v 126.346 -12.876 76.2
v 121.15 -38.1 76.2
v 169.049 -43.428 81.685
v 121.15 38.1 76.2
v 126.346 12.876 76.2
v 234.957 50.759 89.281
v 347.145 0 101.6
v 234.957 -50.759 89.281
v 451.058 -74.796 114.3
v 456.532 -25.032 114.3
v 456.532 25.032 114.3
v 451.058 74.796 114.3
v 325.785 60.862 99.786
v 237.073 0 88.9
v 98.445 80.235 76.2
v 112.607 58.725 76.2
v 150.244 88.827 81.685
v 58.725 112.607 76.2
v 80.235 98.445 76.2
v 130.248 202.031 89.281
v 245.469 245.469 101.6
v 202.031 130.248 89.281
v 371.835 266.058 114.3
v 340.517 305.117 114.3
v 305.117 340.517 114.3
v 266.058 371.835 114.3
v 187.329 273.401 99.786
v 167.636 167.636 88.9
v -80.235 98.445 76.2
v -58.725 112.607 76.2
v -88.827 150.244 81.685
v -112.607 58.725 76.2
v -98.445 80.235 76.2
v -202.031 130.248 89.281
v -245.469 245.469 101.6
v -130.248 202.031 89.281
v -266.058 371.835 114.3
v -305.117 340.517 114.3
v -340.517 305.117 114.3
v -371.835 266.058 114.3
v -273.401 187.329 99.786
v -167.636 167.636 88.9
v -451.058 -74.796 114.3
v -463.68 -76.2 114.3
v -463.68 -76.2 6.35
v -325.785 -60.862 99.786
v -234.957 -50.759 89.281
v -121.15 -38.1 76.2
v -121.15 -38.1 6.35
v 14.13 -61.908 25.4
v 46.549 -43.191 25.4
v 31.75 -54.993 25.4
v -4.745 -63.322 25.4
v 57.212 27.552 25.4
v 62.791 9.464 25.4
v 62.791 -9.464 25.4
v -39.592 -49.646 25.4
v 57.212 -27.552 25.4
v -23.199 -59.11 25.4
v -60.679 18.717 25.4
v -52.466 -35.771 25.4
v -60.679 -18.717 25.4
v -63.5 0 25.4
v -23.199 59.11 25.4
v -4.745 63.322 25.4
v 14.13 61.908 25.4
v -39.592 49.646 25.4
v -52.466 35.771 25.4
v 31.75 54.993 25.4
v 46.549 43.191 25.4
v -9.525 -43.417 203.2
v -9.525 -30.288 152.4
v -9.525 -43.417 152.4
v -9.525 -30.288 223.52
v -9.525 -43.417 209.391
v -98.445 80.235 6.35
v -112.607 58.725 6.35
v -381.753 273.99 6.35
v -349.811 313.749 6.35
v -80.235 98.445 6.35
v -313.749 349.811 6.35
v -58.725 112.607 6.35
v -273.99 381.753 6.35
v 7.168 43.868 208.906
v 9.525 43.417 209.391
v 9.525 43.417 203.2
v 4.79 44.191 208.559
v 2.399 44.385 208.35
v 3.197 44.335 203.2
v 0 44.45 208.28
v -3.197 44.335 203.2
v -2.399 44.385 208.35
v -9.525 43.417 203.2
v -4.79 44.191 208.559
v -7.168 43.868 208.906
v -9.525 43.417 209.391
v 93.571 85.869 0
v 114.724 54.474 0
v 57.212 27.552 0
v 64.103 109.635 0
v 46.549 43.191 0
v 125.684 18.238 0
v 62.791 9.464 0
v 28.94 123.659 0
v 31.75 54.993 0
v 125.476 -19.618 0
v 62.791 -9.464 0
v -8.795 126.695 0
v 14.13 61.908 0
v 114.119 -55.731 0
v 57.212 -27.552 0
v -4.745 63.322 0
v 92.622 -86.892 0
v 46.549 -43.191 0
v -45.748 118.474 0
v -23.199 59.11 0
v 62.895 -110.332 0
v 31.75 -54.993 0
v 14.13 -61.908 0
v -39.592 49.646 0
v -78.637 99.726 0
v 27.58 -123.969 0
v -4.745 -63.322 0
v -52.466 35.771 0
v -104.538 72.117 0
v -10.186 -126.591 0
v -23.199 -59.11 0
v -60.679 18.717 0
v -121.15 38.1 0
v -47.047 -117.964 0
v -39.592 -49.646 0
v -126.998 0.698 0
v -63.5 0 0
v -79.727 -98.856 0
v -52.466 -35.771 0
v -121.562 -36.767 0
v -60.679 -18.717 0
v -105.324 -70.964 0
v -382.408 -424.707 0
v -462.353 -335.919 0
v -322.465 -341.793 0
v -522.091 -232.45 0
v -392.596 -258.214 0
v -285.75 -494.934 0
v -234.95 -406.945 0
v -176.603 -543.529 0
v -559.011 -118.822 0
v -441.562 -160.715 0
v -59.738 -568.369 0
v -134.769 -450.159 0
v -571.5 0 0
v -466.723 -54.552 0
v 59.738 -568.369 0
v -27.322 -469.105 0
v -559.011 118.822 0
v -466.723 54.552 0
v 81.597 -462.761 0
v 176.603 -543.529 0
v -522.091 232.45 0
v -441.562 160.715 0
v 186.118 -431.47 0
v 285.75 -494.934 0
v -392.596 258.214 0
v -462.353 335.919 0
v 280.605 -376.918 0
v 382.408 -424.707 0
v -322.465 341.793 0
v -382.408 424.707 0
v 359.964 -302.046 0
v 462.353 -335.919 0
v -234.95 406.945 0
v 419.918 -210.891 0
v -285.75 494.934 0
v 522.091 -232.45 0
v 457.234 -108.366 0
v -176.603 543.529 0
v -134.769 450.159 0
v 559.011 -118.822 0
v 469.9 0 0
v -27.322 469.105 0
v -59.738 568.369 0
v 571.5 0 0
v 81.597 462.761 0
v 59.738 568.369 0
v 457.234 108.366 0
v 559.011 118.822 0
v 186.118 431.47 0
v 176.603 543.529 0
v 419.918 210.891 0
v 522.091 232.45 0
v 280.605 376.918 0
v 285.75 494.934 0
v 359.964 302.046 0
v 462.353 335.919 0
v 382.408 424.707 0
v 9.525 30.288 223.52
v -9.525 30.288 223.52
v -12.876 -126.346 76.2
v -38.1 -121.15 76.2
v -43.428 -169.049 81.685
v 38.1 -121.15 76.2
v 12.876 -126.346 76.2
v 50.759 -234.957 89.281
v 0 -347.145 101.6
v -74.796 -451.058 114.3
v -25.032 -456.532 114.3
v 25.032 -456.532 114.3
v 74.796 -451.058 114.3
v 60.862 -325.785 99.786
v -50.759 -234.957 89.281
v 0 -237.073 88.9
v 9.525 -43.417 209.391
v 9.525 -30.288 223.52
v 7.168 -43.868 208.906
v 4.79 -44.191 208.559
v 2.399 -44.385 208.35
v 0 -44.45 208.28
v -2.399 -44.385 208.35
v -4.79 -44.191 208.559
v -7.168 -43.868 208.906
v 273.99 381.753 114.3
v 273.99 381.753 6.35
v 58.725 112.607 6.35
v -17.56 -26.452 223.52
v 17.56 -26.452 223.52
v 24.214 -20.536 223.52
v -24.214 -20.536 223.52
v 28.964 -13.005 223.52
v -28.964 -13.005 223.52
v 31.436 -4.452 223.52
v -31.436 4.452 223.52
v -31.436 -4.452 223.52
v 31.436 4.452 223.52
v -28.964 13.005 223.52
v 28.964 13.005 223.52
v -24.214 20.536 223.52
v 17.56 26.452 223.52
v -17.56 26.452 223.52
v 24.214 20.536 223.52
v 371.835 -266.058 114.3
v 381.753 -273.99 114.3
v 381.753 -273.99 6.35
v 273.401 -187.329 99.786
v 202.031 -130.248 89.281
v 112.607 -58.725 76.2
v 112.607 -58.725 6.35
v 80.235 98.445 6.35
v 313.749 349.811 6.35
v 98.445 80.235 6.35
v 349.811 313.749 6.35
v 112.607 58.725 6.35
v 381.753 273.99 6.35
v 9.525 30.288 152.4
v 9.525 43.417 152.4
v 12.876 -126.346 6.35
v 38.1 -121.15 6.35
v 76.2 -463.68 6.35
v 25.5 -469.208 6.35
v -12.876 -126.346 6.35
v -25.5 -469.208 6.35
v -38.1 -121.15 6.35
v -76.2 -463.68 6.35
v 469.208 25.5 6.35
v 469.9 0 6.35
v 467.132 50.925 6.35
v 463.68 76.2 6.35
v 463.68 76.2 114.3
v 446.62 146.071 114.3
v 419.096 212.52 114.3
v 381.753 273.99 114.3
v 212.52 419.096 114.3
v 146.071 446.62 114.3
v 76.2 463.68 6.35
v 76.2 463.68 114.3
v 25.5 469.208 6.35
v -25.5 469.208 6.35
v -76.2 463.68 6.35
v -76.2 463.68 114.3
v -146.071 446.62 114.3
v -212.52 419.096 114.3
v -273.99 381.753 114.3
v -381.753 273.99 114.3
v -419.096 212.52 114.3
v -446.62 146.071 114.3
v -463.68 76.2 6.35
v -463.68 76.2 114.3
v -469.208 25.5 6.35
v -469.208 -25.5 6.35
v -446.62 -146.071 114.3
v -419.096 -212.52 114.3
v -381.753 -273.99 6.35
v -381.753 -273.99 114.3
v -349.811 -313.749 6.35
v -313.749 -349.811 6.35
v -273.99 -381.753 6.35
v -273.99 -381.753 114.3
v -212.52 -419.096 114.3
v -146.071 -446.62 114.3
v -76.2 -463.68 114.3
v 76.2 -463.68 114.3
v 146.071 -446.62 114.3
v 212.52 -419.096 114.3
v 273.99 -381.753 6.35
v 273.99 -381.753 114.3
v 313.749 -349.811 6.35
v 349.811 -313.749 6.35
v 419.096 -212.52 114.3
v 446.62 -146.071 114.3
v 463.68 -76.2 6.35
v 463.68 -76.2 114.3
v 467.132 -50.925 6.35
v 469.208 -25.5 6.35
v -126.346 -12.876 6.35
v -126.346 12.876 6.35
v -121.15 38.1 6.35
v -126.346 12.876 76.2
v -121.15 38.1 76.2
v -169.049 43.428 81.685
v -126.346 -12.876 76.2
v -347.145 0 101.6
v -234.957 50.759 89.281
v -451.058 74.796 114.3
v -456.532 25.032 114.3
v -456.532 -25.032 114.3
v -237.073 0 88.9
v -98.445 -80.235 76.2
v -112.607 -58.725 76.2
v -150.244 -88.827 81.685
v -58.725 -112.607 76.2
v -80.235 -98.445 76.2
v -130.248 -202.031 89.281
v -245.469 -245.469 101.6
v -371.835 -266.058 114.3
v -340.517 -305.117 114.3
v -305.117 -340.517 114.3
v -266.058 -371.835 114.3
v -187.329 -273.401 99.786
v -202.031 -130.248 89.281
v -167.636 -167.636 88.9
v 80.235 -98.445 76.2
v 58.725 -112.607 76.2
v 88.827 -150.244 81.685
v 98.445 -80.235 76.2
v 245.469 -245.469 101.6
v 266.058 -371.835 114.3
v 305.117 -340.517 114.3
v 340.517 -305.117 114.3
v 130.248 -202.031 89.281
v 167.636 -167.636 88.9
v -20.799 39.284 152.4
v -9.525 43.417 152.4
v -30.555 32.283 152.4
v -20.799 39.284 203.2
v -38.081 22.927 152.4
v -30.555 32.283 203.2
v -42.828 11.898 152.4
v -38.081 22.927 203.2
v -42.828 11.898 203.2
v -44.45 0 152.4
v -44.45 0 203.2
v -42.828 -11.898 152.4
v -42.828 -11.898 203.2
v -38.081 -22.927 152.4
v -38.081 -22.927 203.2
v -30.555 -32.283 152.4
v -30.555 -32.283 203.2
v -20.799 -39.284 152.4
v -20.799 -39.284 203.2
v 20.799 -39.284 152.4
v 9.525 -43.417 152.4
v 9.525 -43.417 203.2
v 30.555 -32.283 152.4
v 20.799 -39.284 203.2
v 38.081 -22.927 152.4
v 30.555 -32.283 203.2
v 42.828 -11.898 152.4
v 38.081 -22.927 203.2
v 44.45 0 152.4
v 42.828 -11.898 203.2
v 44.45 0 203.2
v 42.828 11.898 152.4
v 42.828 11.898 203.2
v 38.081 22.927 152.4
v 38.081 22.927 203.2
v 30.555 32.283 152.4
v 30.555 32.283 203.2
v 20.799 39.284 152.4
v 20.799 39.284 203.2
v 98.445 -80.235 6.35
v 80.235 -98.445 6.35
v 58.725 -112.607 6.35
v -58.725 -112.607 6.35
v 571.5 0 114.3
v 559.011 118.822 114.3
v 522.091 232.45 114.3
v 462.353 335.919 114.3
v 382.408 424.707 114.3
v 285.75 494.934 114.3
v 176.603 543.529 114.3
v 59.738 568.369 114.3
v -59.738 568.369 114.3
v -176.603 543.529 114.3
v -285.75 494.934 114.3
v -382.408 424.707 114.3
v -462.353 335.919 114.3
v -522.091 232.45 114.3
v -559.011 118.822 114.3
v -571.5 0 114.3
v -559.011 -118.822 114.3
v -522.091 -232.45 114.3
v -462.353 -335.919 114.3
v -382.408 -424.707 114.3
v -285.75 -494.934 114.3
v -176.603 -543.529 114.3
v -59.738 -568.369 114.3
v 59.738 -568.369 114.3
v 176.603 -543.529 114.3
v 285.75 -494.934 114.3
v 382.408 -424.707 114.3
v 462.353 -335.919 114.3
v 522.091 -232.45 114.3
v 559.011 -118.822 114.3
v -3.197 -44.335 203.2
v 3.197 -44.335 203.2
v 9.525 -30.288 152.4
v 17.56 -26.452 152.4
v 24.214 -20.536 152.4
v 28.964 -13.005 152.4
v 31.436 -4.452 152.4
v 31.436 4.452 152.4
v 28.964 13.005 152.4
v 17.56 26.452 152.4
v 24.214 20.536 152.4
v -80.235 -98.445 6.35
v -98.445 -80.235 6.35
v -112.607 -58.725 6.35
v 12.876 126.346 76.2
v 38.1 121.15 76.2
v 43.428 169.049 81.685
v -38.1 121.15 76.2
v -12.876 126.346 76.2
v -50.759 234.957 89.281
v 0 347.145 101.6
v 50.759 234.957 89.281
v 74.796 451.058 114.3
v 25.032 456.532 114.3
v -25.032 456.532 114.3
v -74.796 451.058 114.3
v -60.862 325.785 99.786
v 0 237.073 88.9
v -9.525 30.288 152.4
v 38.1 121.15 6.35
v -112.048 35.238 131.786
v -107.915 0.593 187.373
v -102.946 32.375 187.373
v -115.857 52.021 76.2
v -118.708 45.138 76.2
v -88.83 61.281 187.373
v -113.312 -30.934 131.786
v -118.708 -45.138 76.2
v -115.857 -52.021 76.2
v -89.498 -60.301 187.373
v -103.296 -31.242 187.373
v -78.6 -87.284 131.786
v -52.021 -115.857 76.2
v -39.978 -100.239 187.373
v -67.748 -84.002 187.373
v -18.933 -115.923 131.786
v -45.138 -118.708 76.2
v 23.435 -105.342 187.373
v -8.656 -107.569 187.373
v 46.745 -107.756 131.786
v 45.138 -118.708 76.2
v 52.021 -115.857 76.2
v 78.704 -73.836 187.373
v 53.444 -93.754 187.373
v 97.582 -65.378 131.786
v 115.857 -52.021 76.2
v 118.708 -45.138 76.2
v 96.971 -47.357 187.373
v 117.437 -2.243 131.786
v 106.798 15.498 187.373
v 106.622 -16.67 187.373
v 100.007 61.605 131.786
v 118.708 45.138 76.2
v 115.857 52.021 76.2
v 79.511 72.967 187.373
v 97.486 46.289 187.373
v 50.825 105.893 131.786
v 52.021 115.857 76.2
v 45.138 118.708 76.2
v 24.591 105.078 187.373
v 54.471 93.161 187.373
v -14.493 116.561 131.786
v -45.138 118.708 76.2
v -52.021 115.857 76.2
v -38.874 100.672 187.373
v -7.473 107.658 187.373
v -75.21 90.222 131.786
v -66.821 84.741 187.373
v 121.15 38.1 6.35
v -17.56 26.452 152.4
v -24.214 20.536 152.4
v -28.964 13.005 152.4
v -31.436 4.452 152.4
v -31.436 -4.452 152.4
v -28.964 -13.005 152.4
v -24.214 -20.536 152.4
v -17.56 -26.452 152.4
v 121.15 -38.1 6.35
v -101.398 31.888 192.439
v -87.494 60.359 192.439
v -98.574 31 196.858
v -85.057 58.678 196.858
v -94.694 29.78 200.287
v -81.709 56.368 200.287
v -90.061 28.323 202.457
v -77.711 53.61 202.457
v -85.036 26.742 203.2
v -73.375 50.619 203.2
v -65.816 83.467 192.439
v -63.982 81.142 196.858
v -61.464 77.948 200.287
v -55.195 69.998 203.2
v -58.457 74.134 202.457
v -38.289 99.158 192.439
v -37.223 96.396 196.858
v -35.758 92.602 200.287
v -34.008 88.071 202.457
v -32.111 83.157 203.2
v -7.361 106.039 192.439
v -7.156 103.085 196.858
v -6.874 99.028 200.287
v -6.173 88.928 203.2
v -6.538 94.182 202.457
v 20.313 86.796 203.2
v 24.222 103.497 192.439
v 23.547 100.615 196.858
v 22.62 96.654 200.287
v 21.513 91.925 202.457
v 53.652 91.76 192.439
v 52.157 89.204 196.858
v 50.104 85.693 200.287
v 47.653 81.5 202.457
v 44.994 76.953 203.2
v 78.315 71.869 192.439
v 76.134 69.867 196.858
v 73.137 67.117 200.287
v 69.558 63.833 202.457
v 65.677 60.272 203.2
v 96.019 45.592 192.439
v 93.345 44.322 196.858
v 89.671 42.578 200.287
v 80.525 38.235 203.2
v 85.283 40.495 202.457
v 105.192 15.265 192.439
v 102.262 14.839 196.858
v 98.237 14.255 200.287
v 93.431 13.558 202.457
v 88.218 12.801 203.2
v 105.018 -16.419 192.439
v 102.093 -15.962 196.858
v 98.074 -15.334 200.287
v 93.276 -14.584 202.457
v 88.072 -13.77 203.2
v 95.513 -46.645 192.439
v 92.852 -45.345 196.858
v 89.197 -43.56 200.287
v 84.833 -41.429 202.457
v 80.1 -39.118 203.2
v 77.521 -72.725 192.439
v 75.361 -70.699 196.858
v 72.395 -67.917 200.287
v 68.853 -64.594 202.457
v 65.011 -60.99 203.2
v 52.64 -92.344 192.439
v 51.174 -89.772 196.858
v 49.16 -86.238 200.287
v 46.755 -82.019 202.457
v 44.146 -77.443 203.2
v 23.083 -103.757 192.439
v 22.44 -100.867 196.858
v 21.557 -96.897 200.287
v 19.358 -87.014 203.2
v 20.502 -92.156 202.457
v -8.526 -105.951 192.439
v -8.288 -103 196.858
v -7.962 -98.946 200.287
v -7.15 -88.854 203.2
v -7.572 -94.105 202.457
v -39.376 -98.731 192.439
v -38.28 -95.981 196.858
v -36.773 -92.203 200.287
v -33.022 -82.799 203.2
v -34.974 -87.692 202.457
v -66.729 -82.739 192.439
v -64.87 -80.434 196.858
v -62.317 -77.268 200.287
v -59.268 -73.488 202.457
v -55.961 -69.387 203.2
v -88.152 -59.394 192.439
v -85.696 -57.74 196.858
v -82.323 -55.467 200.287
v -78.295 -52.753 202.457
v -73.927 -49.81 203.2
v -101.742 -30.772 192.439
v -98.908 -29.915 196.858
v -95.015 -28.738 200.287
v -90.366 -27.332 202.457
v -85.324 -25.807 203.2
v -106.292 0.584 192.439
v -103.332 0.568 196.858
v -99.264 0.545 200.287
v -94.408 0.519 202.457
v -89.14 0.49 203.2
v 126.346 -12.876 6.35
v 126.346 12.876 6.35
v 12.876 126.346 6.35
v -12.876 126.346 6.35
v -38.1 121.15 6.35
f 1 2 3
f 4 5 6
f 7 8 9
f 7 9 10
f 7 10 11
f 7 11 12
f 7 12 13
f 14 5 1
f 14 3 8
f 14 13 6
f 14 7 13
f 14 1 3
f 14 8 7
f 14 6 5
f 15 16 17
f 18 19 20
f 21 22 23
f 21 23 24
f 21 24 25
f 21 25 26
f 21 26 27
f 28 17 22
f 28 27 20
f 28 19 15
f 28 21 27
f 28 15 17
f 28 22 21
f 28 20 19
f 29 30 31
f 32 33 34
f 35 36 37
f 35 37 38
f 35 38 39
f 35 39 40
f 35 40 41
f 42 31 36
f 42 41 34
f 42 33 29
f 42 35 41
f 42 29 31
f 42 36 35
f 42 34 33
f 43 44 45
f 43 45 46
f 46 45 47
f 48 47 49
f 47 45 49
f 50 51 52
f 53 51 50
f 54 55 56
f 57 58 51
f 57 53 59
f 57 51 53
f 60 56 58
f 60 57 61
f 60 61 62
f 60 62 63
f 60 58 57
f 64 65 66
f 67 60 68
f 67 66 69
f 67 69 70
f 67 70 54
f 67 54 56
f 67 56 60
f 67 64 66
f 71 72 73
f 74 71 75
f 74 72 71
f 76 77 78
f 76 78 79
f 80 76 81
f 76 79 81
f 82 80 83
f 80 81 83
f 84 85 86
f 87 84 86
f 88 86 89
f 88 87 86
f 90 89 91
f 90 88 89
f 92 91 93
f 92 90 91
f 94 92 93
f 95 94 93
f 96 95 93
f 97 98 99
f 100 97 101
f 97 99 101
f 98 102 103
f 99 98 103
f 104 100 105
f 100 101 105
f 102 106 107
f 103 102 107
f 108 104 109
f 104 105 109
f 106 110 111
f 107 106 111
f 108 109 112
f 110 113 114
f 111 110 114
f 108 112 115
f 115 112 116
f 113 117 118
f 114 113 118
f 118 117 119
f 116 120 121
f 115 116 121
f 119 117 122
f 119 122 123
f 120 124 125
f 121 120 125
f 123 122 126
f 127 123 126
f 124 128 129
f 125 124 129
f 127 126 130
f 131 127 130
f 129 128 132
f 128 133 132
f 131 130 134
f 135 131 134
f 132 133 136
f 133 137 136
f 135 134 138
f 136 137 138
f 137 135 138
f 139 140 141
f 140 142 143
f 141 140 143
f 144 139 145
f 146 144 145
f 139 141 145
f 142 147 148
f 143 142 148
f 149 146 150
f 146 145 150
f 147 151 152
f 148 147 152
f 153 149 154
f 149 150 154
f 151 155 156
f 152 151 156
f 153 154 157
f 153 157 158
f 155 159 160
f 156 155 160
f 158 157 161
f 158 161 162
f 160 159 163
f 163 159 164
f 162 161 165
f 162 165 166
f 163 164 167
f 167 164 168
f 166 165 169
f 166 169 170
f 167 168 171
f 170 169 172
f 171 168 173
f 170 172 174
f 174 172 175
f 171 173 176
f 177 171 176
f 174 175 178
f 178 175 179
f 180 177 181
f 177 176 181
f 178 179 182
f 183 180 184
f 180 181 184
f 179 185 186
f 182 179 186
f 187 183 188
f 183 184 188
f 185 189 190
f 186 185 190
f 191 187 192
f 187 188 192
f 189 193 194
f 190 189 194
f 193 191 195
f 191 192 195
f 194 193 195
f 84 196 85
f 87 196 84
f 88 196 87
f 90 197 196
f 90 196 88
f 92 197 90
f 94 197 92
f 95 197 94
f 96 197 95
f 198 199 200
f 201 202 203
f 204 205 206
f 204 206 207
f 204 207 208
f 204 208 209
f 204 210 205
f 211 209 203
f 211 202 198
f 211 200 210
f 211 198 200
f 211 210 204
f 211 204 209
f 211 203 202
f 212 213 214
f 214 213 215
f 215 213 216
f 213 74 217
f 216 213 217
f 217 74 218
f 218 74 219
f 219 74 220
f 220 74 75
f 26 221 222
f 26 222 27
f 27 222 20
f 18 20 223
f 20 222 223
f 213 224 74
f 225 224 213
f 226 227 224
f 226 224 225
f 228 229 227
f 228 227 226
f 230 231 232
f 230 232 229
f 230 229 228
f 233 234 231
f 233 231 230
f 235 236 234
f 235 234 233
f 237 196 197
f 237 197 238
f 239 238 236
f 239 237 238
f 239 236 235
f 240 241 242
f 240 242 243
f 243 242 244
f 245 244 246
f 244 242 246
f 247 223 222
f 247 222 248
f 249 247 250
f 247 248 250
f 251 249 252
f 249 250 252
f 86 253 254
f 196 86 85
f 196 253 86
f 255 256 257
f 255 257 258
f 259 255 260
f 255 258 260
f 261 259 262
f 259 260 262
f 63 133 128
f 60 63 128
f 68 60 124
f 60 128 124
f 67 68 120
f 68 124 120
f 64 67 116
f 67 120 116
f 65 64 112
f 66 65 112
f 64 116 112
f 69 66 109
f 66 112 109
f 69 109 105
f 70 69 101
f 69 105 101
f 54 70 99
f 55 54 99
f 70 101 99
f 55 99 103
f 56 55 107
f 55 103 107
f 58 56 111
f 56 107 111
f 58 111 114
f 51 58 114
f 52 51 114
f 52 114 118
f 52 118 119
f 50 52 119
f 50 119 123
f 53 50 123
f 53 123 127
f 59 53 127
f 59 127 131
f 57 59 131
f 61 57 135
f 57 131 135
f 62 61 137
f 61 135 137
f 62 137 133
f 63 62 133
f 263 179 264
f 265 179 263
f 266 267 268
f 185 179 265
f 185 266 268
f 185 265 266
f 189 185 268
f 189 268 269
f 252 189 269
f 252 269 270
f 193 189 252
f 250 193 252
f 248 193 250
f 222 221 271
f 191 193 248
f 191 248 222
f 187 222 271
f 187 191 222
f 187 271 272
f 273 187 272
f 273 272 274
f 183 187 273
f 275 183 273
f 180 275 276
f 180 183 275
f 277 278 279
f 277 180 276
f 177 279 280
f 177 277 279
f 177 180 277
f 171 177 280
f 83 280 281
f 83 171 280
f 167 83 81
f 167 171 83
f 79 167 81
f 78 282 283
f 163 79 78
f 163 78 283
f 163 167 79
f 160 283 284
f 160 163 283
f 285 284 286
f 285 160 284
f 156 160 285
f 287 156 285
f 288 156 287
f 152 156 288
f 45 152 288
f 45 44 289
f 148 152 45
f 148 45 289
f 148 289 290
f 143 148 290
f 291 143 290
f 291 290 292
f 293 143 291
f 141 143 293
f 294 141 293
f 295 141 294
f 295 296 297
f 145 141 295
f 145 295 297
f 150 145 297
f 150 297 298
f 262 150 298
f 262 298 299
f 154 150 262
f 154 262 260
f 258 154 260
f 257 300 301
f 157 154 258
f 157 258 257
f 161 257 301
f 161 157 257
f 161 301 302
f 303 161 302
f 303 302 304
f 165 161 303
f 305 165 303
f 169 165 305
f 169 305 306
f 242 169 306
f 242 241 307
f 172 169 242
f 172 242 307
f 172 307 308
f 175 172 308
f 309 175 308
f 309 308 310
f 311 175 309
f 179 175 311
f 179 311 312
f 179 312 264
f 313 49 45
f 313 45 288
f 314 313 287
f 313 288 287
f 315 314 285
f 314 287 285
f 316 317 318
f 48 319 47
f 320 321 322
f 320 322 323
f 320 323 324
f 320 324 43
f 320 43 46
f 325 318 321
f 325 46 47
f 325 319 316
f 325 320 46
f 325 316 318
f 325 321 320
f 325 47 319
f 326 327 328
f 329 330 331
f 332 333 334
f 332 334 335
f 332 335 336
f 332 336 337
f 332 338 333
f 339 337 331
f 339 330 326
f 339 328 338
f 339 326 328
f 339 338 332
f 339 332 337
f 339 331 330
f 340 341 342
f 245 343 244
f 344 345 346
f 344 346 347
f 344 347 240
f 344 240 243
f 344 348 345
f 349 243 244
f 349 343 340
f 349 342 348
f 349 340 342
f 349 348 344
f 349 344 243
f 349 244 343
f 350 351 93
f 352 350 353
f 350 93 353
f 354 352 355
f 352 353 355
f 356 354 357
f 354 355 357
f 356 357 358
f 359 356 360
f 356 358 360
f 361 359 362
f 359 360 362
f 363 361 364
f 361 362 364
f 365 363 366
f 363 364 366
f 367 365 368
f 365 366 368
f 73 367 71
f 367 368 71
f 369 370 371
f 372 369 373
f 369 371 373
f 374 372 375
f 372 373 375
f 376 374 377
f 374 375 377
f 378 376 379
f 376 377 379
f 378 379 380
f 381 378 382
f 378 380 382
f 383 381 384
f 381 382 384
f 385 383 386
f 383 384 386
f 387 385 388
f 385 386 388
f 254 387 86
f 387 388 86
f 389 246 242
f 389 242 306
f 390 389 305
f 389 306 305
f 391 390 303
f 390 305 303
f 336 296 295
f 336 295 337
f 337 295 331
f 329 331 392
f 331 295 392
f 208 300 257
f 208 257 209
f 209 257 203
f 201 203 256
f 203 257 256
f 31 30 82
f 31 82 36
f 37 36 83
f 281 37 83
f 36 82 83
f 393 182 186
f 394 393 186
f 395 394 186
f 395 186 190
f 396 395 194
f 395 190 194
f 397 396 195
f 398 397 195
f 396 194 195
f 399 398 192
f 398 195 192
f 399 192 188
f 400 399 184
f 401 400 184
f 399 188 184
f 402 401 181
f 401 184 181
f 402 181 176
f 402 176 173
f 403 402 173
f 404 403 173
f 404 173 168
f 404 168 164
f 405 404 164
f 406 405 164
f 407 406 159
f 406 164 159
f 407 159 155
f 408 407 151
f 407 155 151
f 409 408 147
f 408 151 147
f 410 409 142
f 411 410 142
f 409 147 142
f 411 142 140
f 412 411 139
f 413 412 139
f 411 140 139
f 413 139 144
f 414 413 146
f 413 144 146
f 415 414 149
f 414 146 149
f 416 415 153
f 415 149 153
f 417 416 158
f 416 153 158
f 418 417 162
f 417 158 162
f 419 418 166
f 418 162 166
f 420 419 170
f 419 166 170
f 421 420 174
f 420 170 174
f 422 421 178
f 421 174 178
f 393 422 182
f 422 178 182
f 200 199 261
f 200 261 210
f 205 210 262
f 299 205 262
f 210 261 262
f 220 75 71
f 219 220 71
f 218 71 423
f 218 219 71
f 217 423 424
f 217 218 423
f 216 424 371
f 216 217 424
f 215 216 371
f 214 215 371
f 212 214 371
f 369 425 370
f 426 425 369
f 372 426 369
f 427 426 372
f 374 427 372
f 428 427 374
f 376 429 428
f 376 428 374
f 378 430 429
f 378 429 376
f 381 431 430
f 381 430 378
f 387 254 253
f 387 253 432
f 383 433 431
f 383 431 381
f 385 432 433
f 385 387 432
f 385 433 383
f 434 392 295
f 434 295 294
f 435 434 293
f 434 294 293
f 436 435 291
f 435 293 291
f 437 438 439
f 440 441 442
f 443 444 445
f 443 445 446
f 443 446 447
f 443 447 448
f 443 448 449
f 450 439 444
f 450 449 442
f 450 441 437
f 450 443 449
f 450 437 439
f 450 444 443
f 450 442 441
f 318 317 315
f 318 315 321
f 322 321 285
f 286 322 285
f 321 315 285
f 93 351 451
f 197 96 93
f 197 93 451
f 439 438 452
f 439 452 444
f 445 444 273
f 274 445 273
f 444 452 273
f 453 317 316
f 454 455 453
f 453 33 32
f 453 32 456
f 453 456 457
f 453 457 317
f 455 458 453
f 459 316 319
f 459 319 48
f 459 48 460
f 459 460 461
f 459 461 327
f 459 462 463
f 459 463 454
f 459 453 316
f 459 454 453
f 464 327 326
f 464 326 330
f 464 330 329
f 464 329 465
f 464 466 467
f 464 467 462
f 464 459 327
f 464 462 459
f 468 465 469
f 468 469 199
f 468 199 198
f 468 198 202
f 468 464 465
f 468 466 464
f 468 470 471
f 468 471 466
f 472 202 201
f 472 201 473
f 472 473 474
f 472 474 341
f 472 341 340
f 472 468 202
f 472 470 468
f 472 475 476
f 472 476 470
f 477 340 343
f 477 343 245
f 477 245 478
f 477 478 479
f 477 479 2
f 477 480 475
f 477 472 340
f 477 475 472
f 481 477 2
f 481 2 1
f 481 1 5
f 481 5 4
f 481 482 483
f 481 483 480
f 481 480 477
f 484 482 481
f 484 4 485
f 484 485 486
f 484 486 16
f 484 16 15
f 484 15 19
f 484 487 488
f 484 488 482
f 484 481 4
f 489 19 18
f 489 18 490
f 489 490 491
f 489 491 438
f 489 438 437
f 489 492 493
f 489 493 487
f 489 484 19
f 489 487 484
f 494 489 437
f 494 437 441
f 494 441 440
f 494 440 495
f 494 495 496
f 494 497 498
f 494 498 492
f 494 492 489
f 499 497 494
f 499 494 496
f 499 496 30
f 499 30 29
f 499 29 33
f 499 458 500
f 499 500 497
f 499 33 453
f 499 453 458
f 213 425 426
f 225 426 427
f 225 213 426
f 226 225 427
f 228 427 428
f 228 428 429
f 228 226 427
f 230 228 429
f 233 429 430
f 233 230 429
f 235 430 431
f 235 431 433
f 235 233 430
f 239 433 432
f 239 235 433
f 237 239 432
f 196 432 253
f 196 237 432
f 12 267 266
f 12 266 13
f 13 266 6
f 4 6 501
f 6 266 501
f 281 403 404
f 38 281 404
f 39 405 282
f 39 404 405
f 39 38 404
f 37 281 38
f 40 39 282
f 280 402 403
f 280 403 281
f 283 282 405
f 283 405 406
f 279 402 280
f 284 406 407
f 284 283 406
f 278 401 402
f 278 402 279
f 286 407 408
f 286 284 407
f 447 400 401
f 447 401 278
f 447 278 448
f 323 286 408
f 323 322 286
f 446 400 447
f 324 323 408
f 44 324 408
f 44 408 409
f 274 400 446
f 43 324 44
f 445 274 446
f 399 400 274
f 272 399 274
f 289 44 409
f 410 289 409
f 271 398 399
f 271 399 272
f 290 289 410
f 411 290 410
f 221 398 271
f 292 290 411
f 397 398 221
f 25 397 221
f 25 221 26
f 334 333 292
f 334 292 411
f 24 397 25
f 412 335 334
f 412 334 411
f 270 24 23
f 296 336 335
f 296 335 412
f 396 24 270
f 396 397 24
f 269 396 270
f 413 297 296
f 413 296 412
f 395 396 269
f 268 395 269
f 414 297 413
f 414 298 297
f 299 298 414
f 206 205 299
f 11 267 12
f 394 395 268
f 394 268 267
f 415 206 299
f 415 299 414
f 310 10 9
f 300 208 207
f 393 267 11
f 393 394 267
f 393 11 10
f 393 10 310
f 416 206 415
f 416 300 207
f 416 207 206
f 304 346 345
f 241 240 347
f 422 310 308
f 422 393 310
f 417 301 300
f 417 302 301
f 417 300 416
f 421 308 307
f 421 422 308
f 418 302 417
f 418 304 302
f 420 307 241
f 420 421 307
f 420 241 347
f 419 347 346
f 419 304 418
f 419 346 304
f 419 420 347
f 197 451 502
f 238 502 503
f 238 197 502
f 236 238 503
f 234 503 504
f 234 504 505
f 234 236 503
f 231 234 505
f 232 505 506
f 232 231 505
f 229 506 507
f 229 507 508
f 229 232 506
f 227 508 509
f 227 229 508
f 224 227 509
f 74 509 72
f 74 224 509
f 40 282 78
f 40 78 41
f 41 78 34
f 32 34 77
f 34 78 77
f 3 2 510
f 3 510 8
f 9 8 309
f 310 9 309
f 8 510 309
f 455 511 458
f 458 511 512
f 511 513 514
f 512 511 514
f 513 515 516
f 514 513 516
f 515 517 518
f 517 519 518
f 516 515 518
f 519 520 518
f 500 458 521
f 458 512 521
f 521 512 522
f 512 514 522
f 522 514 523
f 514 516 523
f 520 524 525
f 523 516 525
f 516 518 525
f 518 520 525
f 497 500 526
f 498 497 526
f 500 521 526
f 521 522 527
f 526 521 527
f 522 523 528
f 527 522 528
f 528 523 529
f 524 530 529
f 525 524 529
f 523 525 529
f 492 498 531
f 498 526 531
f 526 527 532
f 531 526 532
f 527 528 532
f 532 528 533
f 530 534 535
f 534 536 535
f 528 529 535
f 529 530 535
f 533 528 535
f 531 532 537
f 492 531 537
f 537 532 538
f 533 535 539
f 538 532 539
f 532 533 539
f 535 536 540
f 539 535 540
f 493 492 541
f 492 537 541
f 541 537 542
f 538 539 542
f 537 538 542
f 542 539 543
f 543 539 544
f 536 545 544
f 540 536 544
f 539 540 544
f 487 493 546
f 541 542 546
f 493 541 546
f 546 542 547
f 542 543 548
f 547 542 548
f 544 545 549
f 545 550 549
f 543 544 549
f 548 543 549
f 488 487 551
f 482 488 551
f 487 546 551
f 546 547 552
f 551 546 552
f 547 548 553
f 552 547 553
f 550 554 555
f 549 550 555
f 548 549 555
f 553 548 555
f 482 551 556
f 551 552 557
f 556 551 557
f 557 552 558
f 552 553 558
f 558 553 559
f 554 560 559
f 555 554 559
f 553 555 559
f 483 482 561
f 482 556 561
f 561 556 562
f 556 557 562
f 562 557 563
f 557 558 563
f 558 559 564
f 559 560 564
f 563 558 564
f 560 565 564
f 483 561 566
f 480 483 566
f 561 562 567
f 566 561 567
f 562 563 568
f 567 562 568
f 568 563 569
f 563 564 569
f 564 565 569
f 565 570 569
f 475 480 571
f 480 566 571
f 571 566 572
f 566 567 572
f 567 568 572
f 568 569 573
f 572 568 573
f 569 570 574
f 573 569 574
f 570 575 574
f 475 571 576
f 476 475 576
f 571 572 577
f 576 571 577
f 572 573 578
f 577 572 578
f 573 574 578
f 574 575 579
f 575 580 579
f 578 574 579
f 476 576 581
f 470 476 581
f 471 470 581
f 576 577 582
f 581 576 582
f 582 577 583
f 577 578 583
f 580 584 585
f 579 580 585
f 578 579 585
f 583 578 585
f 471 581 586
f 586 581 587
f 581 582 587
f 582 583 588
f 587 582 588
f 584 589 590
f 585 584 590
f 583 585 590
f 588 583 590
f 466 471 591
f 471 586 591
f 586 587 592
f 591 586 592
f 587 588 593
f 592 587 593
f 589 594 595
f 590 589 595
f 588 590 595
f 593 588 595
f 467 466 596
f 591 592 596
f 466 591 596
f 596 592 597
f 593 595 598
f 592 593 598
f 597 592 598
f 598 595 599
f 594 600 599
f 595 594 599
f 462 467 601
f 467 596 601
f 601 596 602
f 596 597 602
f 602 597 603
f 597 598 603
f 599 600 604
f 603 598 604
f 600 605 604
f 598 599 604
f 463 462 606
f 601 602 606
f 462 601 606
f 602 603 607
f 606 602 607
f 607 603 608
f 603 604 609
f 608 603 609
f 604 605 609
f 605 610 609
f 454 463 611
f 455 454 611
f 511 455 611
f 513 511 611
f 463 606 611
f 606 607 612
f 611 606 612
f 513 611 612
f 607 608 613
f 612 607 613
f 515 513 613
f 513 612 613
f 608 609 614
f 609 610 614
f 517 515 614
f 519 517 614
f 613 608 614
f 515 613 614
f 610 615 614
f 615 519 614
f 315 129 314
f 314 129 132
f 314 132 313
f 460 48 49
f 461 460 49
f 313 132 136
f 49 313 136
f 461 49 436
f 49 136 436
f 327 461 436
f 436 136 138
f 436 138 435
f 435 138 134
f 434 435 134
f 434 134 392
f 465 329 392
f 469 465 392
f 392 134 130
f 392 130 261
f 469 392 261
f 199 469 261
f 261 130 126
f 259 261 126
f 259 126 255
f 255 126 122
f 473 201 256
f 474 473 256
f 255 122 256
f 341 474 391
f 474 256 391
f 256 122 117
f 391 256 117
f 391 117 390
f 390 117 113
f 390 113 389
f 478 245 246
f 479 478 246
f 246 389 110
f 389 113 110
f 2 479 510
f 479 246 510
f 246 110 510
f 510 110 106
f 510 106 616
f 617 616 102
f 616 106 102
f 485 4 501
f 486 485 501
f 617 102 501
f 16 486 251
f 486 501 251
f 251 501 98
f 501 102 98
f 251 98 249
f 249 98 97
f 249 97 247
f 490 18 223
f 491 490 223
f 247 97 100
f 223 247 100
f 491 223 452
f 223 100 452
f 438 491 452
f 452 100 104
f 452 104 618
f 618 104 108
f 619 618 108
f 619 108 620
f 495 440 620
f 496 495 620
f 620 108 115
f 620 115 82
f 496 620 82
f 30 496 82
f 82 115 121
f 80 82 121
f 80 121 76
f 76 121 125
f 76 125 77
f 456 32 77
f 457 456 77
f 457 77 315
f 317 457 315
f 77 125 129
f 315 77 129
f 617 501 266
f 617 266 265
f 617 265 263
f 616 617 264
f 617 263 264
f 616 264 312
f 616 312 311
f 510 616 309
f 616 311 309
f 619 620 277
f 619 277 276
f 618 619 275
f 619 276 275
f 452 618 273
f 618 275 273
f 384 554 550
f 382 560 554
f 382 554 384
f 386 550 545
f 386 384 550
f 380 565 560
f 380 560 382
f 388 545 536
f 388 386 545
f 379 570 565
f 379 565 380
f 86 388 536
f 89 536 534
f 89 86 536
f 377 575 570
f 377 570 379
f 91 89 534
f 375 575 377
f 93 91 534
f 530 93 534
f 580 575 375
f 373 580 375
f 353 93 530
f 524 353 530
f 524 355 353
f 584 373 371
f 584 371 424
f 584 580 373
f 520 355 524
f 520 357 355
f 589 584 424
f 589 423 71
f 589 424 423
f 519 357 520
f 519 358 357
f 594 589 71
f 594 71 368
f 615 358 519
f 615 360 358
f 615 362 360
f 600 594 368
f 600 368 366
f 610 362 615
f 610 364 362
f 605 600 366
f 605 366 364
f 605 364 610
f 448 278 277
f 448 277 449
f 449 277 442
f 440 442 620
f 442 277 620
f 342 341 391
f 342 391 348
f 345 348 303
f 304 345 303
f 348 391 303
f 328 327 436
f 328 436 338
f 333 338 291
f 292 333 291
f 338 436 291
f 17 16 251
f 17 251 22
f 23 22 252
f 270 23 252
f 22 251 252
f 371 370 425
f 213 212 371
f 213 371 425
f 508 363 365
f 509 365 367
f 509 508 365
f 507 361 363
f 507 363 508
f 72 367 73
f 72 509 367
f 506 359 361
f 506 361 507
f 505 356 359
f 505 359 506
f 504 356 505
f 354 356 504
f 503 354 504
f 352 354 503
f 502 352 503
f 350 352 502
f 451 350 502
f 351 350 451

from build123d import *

# Parameters (mm, degrees)
SKETCH1_R               = 571.5
SKETCH1_R_2             = 469.9
BOSS_EXTRUDE1_DEPTH     = 114.3
BOSS_EXTRUDE2_START     = -107.95
BOSS_EXTRUDE2_DEPTH     = 107.95
CIRPATTERN2_COUNT       = 8
SKETCH18_R              = 457.217714823
SKETCH17_R              = 127
SKETCH9_R               = 127
BOSS_EXTRUDE4_DEPTH     = 76.2
SKETCH10_R              = 127
BOSS_EXTRUDE6_DEPTH     = 127
BOSS_EXTRUDE6_TAPER     = 9.74
FILLET1_R               = 19.05
SKETCH13_R              = 44.45
CUT_EXTRUDE2_DEPTH      = 50.8
BOSS_EXTRUDE9_START     = 71.12
BOSS_EXTRUDE9_DEPTH     = 71.12
CUT_EXTRUDE3_DEPTH      = 71.12
CUT_EXTRUDE3_DEPTH_BACK = 71.12
SKETCH19_R              = 63.5
CUT_EXTRUDE4_DEPTH      = 25.4


with BuildPart() as part:
    # Sketch1 → Boss-Extrude1 (new body)
    with BuildSketch(Plane.XY):
        Circle(SKETCH1_R)
        Circle(SKETCH1_R_2, mode=Mode.SUBTRACT)
    extrude(amount=BOSS_EXTRUDE1_DEPTH)

    # Sketch2 → Boss-Extrude2 (add)
    with BuildSketch(Plane.XY.offset(114.3).offset(BOSS_EXTRUDE2_START)):
        with BuildLine():
            ThreePointArc((76.2, 463.680461094), (0, 469.9), (-76.2, 463.680461094))
            Line((-76.2, 463.680461094), (-38.1, 121.15027858))
            ThreePointArc((-38.1, 121.15027858), (0, 127), (38.1, 121.15027858))
            Line((38.1, 121.15027858), (76.2, 463.680461094))
        make_face()
    boss_extrude2 = extrude(amount=BOSS_EXTRUDE2_DEPTH)

    # CirPattern2: Boss-Extrude2 ×8 about axis
    cirpattern2_axis = Axis((0, 0, 0), (0, 0, 1))
    for i in range(1, CIRPATTERN2_COUNT):
        add(boss_extrude2.rotate(cirpattern2_axis, i * 360 / CIRPATTERN2_COUNT))

    # Sketch18 → Cut-Loft1 section 0
    with BuildSketch(Plane.XY.offset(114.3)):
        Circle(SKETCH18_R)
    # Sketch17 → Cut-Loft1 section 1
    with BuildSketch(Plane.XY.offset(76.2)):
        Circle(SKETCH17_R)
    loft(mode=Mode.SUBTRACT)

    # Sketch9 → Boss-Extrude4 (add)
    with BuildSketch(Plane.XY):
        with Locations(Location((0, 0, 0), (0, 0, 162.542396876))):
            Circle(SKETCH9_R)
    extrude(amount=BOSS_EXTRUDE4_DEPTH)

    # Sketch10 → Boss-Extrude6 (add)
    with BuildSketch(Plane.XY.offset(76.2)):
        with Locations(Location((0, 0, 0), (0, 0, 162.542396876))):
            Circle(SKETCH10_R)
    extrude(amount=BOSS_EXTRUDE6_DEPTH, taper=BOSS_EXTRUDE6_TAPER)

    # Fillet1
    fillet1_edges = [part.edges().sort_by_distance(p)[0] for p in [
        (100.35462173, -31.560068477, 203.2),
    ]]
    fillet(fillet1_edges, radius=FILLET1_R)

    # Sketch13 → Cut-Extrude2 (cut)
    with BuildSketch(Plane.XY.offset(203.2)):
        Circle(SKETCH13_R)
    extrude(amount=-CUT_EXTRUDE2_DEPTH, mode=Mode.SUBTRACT)

    # Sketch15 → Boss-Extrude9 (add)
    with BuildSketch(Plane.XY.offset(152.4).offset(BOSS_EXTRUDE9_START)):
        with BuildLine():
            Line((-9.525, 43.417472001), (-9.525, 30.287569645))
            ThreePointArc((-9.525, 30.287569645), (-31.75, 0), (-9.525, -30.287569645))
            Line((-9.525, -30.287569645), (-9.525, -43.417472001))
            ThreePointArc((-9.525, -43.417472001), (0, -44.45), (9.525, -43.417472001))
            Line((9.525, -43.417472001), (9.525, -30.287569645))
            ThreePointArc((9.525, -30.287569645), (31.75, 0), (9.525, 30.287569645))
            Line((9.525, 30.287569645), (9.525, 43.417472001))
            ThreePointArc((9.525, 43.417472001), (0, 44.45), (-9.525, 43.417472001))
        make_face()
    extrude(amount=-BOSS_EXTRUDE9_DEPTH)

    # Sketch16 → Cut-Extrude3 (cut, two sides: drawn at the far end of the back side and taken through both)
    with BuildSketch(Plane(origin=(0, 0, 0), x_dir=(0, 0, -1), z_dir=(1, 0, 0)).offset(-CUT_EXTRUDE3_DEPTH_BACK)):
        Polygon((-223.52, 30.287569645), (-208.28, 44.45), (-223.52, 44.45), align=None)
        Polygon((-223.52, -44.45), (-223.52, -30.287569645), (-208.28, -44.45), align=None)
    extrude(amount=CUT_EXTRUDE3_DEPTH + CUT_EXTRUDE3_DEPTH_BACK, mode=Mode.SUBTRACT)

    # Sketch19 → Cut-Extrude4 (cut)
    with BuildSketch(Plane(origin=(0, 0, 0), x_dir=(-1, 0, 0), z_dir=(0, 0, -1))):
        Circle(SKETCH19_R)
    extrude(amount=-CUT_EXTRUDE4_DEPTH, mode=Mode.SUBTRACT)


solid = part.part
